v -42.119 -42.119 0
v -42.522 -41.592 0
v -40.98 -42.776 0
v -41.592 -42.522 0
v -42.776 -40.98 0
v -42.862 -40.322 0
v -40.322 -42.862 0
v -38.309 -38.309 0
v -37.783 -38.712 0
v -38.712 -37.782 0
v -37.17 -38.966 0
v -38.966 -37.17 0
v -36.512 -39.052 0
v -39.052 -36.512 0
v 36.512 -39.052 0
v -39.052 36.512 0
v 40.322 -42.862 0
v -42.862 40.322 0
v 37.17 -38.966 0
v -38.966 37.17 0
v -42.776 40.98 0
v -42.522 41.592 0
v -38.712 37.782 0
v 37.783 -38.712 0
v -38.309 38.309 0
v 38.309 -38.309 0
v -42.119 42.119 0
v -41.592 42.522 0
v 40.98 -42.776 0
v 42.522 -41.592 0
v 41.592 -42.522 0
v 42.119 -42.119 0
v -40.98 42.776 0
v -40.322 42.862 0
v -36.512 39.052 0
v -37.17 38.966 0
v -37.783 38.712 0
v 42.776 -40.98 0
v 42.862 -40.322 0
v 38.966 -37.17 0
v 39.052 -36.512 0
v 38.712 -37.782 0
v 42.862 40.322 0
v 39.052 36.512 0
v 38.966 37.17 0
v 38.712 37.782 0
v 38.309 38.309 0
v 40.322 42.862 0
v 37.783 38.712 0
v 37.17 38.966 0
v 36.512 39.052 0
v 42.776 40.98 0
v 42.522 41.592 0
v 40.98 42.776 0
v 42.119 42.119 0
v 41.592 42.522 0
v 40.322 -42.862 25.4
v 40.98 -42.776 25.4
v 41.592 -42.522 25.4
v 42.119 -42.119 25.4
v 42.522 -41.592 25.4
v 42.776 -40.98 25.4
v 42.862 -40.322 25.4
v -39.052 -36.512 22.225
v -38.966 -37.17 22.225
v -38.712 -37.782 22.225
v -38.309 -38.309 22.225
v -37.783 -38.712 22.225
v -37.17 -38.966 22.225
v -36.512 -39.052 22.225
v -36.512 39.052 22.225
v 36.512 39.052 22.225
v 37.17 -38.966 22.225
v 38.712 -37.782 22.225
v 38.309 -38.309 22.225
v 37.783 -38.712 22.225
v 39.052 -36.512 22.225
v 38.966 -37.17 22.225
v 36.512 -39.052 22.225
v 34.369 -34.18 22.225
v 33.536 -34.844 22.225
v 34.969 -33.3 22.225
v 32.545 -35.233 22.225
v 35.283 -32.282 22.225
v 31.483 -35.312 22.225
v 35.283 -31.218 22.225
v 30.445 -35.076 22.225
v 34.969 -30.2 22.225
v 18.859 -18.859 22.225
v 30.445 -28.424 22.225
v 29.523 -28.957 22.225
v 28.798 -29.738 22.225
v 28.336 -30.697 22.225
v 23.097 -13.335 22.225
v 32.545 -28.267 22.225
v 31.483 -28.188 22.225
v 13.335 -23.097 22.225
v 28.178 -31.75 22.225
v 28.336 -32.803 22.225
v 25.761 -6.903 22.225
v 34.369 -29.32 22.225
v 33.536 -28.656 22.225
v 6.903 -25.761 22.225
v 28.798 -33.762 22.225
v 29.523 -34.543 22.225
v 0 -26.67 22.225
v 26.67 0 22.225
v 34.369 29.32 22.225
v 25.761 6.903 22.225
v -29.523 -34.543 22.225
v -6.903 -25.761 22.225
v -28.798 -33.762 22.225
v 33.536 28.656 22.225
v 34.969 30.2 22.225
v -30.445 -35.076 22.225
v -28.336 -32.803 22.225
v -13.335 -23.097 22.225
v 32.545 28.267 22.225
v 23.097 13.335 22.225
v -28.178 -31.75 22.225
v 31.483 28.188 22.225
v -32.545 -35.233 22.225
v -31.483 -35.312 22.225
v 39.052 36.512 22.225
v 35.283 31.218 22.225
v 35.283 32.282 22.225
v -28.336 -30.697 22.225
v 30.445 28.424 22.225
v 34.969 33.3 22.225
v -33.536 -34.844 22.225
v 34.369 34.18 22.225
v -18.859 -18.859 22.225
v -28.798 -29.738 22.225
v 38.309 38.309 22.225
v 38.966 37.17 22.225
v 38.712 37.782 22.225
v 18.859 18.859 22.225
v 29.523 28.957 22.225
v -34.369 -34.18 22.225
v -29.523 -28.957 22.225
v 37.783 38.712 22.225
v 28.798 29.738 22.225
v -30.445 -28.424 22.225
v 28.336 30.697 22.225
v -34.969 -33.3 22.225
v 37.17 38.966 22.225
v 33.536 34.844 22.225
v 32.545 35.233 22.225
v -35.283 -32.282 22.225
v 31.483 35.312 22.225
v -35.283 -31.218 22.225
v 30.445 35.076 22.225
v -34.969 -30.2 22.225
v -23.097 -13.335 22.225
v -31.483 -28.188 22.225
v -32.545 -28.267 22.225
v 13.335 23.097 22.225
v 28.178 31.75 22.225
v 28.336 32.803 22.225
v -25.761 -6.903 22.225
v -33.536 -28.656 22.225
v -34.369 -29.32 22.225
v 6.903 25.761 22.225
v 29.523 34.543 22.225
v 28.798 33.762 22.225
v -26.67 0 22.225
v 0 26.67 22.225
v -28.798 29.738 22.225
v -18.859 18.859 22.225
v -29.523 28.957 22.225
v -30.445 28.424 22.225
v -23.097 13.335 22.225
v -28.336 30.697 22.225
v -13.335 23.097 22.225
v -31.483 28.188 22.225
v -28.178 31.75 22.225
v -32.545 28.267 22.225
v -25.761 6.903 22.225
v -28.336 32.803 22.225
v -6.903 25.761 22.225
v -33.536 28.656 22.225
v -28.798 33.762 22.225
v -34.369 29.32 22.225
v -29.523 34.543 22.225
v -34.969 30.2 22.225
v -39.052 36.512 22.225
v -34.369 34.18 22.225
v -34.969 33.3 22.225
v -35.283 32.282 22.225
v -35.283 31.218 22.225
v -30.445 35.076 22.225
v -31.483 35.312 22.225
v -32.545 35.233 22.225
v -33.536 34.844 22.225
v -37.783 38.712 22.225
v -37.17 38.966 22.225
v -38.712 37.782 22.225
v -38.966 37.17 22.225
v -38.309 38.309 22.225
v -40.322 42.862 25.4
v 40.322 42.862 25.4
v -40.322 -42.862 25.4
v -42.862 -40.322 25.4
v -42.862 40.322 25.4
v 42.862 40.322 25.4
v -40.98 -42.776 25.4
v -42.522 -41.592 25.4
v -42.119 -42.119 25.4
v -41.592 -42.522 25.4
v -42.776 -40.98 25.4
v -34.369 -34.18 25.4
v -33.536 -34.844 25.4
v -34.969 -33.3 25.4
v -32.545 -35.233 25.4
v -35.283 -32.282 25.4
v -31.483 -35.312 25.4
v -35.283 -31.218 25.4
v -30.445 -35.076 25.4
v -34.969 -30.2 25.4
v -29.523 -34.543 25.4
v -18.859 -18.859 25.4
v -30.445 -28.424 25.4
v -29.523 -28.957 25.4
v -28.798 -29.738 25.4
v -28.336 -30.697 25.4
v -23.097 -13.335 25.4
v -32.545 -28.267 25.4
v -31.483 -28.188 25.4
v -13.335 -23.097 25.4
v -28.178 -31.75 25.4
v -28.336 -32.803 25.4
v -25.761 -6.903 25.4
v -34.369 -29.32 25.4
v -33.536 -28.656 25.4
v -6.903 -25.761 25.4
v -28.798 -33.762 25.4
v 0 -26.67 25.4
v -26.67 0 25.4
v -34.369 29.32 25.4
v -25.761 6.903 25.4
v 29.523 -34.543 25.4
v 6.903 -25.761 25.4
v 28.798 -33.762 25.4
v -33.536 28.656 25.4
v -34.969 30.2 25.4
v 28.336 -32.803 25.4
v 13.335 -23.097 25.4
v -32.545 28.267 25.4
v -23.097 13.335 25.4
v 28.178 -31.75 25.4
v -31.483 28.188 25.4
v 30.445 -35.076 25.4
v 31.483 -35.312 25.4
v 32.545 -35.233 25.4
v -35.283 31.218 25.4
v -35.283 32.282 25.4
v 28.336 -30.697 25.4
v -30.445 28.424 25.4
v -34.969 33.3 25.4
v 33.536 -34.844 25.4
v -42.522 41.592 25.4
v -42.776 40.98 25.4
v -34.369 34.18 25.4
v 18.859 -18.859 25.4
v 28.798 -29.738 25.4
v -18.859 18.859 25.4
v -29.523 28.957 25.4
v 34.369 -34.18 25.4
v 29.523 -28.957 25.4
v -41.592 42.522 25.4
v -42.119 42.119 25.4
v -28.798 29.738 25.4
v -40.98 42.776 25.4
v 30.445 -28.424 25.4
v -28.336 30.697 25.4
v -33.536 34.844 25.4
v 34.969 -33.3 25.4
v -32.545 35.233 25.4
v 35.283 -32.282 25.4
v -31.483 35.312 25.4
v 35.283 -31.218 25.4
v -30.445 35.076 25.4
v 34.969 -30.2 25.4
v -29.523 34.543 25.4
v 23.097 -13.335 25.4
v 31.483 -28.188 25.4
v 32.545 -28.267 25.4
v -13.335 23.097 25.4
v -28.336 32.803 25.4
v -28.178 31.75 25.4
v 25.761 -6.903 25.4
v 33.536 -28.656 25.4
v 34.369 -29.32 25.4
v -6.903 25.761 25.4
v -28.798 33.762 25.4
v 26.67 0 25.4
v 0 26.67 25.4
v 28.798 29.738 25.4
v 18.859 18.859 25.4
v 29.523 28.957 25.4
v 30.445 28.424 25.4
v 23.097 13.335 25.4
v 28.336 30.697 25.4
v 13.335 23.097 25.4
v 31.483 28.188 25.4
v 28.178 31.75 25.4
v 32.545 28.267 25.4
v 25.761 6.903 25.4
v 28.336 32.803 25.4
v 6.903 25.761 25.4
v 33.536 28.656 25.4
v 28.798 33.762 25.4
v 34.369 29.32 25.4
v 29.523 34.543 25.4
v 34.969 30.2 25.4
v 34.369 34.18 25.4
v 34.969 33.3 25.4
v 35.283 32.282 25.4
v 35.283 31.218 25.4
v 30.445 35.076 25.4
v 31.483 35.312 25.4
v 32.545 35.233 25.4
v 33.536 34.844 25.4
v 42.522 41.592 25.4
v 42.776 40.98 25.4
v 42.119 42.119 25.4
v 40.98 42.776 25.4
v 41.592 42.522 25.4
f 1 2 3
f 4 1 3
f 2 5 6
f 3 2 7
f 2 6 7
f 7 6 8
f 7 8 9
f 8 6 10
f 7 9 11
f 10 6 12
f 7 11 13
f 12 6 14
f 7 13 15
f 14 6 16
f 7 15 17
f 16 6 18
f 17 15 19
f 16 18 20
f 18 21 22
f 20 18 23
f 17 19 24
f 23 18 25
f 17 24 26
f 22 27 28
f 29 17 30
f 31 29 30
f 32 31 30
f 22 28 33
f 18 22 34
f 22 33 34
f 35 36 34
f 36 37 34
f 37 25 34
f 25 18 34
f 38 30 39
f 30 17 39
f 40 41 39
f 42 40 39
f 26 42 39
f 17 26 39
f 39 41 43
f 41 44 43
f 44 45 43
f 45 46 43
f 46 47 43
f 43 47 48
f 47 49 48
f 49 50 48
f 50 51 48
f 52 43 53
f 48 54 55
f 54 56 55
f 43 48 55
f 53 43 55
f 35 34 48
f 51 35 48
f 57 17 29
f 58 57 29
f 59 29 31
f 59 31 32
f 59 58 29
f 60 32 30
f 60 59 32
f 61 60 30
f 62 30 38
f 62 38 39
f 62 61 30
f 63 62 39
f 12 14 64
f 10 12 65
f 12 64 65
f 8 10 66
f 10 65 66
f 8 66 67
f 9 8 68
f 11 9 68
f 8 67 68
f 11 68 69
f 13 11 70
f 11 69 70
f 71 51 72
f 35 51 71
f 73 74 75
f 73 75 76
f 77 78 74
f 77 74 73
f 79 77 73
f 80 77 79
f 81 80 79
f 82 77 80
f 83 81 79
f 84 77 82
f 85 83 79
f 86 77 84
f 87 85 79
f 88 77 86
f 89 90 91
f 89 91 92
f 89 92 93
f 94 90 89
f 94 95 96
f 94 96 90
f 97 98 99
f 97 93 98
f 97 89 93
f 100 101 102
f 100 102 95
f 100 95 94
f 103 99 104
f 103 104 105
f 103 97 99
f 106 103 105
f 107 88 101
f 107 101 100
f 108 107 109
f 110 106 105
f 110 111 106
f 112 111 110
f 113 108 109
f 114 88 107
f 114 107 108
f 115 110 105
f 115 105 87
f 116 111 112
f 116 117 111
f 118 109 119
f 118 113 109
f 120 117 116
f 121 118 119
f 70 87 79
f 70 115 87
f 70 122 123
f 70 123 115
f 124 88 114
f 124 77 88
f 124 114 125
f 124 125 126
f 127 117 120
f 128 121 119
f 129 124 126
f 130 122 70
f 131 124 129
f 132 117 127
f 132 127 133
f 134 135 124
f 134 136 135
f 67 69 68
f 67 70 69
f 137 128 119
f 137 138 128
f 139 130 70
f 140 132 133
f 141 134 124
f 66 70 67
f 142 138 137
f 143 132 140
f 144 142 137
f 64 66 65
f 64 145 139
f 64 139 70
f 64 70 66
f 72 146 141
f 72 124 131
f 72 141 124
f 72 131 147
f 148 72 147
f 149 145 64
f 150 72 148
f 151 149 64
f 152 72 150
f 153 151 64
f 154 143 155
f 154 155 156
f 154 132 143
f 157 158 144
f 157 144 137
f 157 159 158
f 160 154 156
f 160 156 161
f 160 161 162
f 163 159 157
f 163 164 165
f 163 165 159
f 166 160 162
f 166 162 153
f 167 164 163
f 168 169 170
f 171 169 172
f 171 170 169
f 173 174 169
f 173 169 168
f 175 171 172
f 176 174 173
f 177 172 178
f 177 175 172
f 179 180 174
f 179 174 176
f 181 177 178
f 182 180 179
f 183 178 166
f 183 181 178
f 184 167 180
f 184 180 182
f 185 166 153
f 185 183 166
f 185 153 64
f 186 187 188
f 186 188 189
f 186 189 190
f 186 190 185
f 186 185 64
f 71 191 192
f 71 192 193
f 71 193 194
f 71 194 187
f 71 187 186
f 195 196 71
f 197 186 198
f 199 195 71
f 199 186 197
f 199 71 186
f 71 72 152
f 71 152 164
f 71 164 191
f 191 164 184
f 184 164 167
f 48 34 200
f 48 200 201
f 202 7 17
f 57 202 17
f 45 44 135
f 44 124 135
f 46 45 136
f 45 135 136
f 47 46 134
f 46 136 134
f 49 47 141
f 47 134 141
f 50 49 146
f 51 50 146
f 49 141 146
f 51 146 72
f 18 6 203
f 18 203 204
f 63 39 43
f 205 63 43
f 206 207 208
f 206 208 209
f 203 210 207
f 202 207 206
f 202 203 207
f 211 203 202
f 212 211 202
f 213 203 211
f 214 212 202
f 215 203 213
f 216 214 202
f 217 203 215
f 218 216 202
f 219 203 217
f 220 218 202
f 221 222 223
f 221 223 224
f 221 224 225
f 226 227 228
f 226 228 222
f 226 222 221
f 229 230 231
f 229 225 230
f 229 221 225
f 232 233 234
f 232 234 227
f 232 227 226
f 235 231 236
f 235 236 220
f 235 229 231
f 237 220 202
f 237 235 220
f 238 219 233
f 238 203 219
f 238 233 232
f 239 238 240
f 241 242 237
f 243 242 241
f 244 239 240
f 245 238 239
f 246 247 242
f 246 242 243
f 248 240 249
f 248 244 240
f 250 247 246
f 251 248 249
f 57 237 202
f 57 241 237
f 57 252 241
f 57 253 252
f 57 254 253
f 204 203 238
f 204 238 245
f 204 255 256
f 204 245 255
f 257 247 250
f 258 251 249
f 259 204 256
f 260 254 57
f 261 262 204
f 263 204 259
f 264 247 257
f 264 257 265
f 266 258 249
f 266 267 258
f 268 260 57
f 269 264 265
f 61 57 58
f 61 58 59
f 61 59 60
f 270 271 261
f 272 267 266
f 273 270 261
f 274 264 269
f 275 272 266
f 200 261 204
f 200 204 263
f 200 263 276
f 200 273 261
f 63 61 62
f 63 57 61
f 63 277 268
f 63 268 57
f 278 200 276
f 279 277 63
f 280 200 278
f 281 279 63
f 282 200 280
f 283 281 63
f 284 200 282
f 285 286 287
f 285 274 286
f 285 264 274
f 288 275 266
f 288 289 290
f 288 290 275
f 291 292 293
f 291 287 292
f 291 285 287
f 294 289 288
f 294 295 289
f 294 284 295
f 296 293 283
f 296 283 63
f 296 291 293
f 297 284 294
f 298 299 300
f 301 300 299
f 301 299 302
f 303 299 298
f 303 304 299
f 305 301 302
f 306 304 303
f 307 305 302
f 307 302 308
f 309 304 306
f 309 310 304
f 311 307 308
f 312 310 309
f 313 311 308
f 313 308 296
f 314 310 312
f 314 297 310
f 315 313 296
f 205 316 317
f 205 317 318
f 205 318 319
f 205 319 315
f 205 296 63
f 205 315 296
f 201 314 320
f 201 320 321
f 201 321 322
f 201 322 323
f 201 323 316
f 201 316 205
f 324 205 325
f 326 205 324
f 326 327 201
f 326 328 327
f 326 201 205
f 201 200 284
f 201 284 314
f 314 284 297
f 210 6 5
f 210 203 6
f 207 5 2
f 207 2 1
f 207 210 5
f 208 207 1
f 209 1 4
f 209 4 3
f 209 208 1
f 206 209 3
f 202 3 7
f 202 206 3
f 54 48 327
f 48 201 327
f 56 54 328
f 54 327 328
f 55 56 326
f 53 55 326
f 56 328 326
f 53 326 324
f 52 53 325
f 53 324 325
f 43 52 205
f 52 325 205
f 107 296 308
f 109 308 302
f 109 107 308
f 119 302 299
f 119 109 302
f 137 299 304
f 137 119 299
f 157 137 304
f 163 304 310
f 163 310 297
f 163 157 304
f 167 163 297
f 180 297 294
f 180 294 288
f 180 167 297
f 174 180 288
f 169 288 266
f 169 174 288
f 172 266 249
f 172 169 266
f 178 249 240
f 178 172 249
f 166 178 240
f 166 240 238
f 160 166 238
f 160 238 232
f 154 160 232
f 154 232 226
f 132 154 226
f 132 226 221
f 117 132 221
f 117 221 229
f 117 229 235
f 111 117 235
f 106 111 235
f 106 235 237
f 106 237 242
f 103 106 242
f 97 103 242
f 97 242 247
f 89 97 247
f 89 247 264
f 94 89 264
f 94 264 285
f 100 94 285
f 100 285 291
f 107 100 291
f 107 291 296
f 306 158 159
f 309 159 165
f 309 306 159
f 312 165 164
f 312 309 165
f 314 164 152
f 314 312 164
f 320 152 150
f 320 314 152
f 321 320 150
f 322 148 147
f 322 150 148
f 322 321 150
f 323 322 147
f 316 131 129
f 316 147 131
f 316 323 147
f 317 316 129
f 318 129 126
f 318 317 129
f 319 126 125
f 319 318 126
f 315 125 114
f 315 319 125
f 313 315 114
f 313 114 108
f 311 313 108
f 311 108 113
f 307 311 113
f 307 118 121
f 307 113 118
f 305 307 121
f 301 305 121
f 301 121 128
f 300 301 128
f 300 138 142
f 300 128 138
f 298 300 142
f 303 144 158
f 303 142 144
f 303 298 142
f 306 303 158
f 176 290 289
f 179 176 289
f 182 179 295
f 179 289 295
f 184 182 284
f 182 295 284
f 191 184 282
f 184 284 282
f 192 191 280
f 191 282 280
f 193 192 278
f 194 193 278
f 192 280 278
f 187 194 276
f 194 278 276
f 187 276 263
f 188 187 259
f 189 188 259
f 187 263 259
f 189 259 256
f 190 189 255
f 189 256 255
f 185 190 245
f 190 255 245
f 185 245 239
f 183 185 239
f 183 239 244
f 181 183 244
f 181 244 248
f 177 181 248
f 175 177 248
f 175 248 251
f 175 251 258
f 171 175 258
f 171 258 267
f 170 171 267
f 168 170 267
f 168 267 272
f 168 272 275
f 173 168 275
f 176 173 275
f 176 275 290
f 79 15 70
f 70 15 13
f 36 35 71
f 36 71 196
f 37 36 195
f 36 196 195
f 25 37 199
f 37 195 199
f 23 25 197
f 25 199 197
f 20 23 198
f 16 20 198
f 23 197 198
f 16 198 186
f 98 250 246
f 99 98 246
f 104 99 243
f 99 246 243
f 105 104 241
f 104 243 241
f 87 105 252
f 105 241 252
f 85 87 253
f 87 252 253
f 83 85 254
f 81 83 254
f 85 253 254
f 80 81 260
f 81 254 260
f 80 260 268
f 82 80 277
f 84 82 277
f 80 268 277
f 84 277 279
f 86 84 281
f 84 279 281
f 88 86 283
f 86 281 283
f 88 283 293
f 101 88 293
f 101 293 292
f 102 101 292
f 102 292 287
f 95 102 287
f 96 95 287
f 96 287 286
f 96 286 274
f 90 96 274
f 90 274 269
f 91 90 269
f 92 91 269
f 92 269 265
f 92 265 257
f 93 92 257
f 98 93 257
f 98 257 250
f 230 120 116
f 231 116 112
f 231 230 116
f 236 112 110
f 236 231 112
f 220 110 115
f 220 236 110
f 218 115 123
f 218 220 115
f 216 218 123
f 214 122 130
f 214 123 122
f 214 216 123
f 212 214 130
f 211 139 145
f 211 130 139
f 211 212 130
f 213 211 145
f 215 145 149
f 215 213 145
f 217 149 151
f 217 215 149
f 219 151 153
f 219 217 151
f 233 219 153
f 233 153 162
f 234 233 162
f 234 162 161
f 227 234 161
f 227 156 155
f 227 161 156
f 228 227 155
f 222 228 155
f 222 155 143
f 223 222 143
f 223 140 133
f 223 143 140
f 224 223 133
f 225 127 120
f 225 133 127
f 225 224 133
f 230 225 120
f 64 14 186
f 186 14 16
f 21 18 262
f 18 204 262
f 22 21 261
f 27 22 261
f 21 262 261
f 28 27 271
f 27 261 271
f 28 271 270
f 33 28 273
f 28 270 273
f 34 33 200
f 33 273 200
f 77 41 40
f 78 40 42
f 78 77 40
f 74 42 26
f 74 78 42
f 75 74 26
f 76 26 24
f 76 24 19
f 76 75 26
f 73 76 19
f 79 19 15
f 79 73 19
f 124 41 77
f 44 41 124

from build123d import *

# Parameters (mm, degrees)
SKETCH1_W               = 85.725
SKETCH1_H               = 85.725
SKETCH1_R               = 26.67
BOSS_EXTRUDE1_DEPTH     = 25.4
SKETCH2_R               = 3.572453457
CUT_EXTRUDE1_DEPTH      = 26.4
MIRROR2_COPY_1_SKETCH_R = 3.572453457
MIRROR2_COPY_1_DEPTH    = 26.4
SKETCH3_W               = 78.105
SKETCH3_H               = 78.105
CUT_EXTRUDE2_DEPTH      = 22.225
FILLET1_R               = 2.54


with BuildPart() as part:
    # Sketch1 → Boss-Extrude1 (new body)
    with BuildSketch(Plane.XY):
        Rectangle(SKETCH1_W, SKETCH1_H)
        Circle(SKETCH1_R, mode=Mode.SUBTRACT)
    extrude(amount=BOSS_EXTRUDE1_DEPTH)

    # Sketch2 → Cut-Extrude1 (cut, through all)
    with BuildSketch(Plane.XY.offset(25.4)):
        with Locations((-31.75, 31.75)):
            Circle(SKETCH2_R)
    cut_extrude1 = extrude(amount=-CUT_EXTRUDE1_DEPTH, mode=Mode.SUBTRACT)

    # Mirror1: Cut-Extrude1 across plane
    add(cut_extrude1.mirror(Plane(origin=(0, 0, 0), x_dir=(0, 0, 1), z_dir=(1, 0, 0))), mode=Mode.SUBTRACT)

    # Mirror2: Cut-Extrude1 across plane
    add(cut_extrude1.mirror(Plane.ZX), mode=Mode.SUBTRACT)

    # Mirror2 copy 1 sketch → Mirror2 copy 1 (cut, through all)
    with BuildSketch(Plane(origin=(0, 0, 25.4), x_dir=(-1, 0, 0), z_dir=(0, 0, 1))):
        with Locations((-31.75, 31.75)):
            Circle(MIRROR2_COPY_1_SKETCH_R)
    extrude(amount=-MIRROR2_COPY_1_DEPTH, mode=Mode.SUBTRACT)

    # Sketch3 → Cut-Extrude2 (cut)
    with BuildSketch(Plane(origin=(0, 0, 0), x_dir=(-1, 0, 0), z_dir=(0, 0, -1))):
        Rectangle(SKETCH3_W, SKETCH3_H)
    extrude(amount=-CUT_EXTRUDE2_DEPTH, mode=Mode.SUBTRACT)

    # Fillet1
    fillet1_edges = [part.edges().sort_by_distance(p)[0] for p in [
        (-39.0525, -39.0525, 11.1125),
        (-39.0525, 39.0525, 11.1125),
        (39.0525, 39.0525, 11.1125),
        (39.0525, -39.0525, 11.1125),
        (-42.8625, 42.8625, 12.7),
        (42.8625, 42.8625, 12.7),
        (42.8625, -42.8625, 12.7),
        (-42.8625, -42.8625, 12.7),
    ]]
    fillet(fillet1_edges, radius=FILLET1_R)


solid = part.part
